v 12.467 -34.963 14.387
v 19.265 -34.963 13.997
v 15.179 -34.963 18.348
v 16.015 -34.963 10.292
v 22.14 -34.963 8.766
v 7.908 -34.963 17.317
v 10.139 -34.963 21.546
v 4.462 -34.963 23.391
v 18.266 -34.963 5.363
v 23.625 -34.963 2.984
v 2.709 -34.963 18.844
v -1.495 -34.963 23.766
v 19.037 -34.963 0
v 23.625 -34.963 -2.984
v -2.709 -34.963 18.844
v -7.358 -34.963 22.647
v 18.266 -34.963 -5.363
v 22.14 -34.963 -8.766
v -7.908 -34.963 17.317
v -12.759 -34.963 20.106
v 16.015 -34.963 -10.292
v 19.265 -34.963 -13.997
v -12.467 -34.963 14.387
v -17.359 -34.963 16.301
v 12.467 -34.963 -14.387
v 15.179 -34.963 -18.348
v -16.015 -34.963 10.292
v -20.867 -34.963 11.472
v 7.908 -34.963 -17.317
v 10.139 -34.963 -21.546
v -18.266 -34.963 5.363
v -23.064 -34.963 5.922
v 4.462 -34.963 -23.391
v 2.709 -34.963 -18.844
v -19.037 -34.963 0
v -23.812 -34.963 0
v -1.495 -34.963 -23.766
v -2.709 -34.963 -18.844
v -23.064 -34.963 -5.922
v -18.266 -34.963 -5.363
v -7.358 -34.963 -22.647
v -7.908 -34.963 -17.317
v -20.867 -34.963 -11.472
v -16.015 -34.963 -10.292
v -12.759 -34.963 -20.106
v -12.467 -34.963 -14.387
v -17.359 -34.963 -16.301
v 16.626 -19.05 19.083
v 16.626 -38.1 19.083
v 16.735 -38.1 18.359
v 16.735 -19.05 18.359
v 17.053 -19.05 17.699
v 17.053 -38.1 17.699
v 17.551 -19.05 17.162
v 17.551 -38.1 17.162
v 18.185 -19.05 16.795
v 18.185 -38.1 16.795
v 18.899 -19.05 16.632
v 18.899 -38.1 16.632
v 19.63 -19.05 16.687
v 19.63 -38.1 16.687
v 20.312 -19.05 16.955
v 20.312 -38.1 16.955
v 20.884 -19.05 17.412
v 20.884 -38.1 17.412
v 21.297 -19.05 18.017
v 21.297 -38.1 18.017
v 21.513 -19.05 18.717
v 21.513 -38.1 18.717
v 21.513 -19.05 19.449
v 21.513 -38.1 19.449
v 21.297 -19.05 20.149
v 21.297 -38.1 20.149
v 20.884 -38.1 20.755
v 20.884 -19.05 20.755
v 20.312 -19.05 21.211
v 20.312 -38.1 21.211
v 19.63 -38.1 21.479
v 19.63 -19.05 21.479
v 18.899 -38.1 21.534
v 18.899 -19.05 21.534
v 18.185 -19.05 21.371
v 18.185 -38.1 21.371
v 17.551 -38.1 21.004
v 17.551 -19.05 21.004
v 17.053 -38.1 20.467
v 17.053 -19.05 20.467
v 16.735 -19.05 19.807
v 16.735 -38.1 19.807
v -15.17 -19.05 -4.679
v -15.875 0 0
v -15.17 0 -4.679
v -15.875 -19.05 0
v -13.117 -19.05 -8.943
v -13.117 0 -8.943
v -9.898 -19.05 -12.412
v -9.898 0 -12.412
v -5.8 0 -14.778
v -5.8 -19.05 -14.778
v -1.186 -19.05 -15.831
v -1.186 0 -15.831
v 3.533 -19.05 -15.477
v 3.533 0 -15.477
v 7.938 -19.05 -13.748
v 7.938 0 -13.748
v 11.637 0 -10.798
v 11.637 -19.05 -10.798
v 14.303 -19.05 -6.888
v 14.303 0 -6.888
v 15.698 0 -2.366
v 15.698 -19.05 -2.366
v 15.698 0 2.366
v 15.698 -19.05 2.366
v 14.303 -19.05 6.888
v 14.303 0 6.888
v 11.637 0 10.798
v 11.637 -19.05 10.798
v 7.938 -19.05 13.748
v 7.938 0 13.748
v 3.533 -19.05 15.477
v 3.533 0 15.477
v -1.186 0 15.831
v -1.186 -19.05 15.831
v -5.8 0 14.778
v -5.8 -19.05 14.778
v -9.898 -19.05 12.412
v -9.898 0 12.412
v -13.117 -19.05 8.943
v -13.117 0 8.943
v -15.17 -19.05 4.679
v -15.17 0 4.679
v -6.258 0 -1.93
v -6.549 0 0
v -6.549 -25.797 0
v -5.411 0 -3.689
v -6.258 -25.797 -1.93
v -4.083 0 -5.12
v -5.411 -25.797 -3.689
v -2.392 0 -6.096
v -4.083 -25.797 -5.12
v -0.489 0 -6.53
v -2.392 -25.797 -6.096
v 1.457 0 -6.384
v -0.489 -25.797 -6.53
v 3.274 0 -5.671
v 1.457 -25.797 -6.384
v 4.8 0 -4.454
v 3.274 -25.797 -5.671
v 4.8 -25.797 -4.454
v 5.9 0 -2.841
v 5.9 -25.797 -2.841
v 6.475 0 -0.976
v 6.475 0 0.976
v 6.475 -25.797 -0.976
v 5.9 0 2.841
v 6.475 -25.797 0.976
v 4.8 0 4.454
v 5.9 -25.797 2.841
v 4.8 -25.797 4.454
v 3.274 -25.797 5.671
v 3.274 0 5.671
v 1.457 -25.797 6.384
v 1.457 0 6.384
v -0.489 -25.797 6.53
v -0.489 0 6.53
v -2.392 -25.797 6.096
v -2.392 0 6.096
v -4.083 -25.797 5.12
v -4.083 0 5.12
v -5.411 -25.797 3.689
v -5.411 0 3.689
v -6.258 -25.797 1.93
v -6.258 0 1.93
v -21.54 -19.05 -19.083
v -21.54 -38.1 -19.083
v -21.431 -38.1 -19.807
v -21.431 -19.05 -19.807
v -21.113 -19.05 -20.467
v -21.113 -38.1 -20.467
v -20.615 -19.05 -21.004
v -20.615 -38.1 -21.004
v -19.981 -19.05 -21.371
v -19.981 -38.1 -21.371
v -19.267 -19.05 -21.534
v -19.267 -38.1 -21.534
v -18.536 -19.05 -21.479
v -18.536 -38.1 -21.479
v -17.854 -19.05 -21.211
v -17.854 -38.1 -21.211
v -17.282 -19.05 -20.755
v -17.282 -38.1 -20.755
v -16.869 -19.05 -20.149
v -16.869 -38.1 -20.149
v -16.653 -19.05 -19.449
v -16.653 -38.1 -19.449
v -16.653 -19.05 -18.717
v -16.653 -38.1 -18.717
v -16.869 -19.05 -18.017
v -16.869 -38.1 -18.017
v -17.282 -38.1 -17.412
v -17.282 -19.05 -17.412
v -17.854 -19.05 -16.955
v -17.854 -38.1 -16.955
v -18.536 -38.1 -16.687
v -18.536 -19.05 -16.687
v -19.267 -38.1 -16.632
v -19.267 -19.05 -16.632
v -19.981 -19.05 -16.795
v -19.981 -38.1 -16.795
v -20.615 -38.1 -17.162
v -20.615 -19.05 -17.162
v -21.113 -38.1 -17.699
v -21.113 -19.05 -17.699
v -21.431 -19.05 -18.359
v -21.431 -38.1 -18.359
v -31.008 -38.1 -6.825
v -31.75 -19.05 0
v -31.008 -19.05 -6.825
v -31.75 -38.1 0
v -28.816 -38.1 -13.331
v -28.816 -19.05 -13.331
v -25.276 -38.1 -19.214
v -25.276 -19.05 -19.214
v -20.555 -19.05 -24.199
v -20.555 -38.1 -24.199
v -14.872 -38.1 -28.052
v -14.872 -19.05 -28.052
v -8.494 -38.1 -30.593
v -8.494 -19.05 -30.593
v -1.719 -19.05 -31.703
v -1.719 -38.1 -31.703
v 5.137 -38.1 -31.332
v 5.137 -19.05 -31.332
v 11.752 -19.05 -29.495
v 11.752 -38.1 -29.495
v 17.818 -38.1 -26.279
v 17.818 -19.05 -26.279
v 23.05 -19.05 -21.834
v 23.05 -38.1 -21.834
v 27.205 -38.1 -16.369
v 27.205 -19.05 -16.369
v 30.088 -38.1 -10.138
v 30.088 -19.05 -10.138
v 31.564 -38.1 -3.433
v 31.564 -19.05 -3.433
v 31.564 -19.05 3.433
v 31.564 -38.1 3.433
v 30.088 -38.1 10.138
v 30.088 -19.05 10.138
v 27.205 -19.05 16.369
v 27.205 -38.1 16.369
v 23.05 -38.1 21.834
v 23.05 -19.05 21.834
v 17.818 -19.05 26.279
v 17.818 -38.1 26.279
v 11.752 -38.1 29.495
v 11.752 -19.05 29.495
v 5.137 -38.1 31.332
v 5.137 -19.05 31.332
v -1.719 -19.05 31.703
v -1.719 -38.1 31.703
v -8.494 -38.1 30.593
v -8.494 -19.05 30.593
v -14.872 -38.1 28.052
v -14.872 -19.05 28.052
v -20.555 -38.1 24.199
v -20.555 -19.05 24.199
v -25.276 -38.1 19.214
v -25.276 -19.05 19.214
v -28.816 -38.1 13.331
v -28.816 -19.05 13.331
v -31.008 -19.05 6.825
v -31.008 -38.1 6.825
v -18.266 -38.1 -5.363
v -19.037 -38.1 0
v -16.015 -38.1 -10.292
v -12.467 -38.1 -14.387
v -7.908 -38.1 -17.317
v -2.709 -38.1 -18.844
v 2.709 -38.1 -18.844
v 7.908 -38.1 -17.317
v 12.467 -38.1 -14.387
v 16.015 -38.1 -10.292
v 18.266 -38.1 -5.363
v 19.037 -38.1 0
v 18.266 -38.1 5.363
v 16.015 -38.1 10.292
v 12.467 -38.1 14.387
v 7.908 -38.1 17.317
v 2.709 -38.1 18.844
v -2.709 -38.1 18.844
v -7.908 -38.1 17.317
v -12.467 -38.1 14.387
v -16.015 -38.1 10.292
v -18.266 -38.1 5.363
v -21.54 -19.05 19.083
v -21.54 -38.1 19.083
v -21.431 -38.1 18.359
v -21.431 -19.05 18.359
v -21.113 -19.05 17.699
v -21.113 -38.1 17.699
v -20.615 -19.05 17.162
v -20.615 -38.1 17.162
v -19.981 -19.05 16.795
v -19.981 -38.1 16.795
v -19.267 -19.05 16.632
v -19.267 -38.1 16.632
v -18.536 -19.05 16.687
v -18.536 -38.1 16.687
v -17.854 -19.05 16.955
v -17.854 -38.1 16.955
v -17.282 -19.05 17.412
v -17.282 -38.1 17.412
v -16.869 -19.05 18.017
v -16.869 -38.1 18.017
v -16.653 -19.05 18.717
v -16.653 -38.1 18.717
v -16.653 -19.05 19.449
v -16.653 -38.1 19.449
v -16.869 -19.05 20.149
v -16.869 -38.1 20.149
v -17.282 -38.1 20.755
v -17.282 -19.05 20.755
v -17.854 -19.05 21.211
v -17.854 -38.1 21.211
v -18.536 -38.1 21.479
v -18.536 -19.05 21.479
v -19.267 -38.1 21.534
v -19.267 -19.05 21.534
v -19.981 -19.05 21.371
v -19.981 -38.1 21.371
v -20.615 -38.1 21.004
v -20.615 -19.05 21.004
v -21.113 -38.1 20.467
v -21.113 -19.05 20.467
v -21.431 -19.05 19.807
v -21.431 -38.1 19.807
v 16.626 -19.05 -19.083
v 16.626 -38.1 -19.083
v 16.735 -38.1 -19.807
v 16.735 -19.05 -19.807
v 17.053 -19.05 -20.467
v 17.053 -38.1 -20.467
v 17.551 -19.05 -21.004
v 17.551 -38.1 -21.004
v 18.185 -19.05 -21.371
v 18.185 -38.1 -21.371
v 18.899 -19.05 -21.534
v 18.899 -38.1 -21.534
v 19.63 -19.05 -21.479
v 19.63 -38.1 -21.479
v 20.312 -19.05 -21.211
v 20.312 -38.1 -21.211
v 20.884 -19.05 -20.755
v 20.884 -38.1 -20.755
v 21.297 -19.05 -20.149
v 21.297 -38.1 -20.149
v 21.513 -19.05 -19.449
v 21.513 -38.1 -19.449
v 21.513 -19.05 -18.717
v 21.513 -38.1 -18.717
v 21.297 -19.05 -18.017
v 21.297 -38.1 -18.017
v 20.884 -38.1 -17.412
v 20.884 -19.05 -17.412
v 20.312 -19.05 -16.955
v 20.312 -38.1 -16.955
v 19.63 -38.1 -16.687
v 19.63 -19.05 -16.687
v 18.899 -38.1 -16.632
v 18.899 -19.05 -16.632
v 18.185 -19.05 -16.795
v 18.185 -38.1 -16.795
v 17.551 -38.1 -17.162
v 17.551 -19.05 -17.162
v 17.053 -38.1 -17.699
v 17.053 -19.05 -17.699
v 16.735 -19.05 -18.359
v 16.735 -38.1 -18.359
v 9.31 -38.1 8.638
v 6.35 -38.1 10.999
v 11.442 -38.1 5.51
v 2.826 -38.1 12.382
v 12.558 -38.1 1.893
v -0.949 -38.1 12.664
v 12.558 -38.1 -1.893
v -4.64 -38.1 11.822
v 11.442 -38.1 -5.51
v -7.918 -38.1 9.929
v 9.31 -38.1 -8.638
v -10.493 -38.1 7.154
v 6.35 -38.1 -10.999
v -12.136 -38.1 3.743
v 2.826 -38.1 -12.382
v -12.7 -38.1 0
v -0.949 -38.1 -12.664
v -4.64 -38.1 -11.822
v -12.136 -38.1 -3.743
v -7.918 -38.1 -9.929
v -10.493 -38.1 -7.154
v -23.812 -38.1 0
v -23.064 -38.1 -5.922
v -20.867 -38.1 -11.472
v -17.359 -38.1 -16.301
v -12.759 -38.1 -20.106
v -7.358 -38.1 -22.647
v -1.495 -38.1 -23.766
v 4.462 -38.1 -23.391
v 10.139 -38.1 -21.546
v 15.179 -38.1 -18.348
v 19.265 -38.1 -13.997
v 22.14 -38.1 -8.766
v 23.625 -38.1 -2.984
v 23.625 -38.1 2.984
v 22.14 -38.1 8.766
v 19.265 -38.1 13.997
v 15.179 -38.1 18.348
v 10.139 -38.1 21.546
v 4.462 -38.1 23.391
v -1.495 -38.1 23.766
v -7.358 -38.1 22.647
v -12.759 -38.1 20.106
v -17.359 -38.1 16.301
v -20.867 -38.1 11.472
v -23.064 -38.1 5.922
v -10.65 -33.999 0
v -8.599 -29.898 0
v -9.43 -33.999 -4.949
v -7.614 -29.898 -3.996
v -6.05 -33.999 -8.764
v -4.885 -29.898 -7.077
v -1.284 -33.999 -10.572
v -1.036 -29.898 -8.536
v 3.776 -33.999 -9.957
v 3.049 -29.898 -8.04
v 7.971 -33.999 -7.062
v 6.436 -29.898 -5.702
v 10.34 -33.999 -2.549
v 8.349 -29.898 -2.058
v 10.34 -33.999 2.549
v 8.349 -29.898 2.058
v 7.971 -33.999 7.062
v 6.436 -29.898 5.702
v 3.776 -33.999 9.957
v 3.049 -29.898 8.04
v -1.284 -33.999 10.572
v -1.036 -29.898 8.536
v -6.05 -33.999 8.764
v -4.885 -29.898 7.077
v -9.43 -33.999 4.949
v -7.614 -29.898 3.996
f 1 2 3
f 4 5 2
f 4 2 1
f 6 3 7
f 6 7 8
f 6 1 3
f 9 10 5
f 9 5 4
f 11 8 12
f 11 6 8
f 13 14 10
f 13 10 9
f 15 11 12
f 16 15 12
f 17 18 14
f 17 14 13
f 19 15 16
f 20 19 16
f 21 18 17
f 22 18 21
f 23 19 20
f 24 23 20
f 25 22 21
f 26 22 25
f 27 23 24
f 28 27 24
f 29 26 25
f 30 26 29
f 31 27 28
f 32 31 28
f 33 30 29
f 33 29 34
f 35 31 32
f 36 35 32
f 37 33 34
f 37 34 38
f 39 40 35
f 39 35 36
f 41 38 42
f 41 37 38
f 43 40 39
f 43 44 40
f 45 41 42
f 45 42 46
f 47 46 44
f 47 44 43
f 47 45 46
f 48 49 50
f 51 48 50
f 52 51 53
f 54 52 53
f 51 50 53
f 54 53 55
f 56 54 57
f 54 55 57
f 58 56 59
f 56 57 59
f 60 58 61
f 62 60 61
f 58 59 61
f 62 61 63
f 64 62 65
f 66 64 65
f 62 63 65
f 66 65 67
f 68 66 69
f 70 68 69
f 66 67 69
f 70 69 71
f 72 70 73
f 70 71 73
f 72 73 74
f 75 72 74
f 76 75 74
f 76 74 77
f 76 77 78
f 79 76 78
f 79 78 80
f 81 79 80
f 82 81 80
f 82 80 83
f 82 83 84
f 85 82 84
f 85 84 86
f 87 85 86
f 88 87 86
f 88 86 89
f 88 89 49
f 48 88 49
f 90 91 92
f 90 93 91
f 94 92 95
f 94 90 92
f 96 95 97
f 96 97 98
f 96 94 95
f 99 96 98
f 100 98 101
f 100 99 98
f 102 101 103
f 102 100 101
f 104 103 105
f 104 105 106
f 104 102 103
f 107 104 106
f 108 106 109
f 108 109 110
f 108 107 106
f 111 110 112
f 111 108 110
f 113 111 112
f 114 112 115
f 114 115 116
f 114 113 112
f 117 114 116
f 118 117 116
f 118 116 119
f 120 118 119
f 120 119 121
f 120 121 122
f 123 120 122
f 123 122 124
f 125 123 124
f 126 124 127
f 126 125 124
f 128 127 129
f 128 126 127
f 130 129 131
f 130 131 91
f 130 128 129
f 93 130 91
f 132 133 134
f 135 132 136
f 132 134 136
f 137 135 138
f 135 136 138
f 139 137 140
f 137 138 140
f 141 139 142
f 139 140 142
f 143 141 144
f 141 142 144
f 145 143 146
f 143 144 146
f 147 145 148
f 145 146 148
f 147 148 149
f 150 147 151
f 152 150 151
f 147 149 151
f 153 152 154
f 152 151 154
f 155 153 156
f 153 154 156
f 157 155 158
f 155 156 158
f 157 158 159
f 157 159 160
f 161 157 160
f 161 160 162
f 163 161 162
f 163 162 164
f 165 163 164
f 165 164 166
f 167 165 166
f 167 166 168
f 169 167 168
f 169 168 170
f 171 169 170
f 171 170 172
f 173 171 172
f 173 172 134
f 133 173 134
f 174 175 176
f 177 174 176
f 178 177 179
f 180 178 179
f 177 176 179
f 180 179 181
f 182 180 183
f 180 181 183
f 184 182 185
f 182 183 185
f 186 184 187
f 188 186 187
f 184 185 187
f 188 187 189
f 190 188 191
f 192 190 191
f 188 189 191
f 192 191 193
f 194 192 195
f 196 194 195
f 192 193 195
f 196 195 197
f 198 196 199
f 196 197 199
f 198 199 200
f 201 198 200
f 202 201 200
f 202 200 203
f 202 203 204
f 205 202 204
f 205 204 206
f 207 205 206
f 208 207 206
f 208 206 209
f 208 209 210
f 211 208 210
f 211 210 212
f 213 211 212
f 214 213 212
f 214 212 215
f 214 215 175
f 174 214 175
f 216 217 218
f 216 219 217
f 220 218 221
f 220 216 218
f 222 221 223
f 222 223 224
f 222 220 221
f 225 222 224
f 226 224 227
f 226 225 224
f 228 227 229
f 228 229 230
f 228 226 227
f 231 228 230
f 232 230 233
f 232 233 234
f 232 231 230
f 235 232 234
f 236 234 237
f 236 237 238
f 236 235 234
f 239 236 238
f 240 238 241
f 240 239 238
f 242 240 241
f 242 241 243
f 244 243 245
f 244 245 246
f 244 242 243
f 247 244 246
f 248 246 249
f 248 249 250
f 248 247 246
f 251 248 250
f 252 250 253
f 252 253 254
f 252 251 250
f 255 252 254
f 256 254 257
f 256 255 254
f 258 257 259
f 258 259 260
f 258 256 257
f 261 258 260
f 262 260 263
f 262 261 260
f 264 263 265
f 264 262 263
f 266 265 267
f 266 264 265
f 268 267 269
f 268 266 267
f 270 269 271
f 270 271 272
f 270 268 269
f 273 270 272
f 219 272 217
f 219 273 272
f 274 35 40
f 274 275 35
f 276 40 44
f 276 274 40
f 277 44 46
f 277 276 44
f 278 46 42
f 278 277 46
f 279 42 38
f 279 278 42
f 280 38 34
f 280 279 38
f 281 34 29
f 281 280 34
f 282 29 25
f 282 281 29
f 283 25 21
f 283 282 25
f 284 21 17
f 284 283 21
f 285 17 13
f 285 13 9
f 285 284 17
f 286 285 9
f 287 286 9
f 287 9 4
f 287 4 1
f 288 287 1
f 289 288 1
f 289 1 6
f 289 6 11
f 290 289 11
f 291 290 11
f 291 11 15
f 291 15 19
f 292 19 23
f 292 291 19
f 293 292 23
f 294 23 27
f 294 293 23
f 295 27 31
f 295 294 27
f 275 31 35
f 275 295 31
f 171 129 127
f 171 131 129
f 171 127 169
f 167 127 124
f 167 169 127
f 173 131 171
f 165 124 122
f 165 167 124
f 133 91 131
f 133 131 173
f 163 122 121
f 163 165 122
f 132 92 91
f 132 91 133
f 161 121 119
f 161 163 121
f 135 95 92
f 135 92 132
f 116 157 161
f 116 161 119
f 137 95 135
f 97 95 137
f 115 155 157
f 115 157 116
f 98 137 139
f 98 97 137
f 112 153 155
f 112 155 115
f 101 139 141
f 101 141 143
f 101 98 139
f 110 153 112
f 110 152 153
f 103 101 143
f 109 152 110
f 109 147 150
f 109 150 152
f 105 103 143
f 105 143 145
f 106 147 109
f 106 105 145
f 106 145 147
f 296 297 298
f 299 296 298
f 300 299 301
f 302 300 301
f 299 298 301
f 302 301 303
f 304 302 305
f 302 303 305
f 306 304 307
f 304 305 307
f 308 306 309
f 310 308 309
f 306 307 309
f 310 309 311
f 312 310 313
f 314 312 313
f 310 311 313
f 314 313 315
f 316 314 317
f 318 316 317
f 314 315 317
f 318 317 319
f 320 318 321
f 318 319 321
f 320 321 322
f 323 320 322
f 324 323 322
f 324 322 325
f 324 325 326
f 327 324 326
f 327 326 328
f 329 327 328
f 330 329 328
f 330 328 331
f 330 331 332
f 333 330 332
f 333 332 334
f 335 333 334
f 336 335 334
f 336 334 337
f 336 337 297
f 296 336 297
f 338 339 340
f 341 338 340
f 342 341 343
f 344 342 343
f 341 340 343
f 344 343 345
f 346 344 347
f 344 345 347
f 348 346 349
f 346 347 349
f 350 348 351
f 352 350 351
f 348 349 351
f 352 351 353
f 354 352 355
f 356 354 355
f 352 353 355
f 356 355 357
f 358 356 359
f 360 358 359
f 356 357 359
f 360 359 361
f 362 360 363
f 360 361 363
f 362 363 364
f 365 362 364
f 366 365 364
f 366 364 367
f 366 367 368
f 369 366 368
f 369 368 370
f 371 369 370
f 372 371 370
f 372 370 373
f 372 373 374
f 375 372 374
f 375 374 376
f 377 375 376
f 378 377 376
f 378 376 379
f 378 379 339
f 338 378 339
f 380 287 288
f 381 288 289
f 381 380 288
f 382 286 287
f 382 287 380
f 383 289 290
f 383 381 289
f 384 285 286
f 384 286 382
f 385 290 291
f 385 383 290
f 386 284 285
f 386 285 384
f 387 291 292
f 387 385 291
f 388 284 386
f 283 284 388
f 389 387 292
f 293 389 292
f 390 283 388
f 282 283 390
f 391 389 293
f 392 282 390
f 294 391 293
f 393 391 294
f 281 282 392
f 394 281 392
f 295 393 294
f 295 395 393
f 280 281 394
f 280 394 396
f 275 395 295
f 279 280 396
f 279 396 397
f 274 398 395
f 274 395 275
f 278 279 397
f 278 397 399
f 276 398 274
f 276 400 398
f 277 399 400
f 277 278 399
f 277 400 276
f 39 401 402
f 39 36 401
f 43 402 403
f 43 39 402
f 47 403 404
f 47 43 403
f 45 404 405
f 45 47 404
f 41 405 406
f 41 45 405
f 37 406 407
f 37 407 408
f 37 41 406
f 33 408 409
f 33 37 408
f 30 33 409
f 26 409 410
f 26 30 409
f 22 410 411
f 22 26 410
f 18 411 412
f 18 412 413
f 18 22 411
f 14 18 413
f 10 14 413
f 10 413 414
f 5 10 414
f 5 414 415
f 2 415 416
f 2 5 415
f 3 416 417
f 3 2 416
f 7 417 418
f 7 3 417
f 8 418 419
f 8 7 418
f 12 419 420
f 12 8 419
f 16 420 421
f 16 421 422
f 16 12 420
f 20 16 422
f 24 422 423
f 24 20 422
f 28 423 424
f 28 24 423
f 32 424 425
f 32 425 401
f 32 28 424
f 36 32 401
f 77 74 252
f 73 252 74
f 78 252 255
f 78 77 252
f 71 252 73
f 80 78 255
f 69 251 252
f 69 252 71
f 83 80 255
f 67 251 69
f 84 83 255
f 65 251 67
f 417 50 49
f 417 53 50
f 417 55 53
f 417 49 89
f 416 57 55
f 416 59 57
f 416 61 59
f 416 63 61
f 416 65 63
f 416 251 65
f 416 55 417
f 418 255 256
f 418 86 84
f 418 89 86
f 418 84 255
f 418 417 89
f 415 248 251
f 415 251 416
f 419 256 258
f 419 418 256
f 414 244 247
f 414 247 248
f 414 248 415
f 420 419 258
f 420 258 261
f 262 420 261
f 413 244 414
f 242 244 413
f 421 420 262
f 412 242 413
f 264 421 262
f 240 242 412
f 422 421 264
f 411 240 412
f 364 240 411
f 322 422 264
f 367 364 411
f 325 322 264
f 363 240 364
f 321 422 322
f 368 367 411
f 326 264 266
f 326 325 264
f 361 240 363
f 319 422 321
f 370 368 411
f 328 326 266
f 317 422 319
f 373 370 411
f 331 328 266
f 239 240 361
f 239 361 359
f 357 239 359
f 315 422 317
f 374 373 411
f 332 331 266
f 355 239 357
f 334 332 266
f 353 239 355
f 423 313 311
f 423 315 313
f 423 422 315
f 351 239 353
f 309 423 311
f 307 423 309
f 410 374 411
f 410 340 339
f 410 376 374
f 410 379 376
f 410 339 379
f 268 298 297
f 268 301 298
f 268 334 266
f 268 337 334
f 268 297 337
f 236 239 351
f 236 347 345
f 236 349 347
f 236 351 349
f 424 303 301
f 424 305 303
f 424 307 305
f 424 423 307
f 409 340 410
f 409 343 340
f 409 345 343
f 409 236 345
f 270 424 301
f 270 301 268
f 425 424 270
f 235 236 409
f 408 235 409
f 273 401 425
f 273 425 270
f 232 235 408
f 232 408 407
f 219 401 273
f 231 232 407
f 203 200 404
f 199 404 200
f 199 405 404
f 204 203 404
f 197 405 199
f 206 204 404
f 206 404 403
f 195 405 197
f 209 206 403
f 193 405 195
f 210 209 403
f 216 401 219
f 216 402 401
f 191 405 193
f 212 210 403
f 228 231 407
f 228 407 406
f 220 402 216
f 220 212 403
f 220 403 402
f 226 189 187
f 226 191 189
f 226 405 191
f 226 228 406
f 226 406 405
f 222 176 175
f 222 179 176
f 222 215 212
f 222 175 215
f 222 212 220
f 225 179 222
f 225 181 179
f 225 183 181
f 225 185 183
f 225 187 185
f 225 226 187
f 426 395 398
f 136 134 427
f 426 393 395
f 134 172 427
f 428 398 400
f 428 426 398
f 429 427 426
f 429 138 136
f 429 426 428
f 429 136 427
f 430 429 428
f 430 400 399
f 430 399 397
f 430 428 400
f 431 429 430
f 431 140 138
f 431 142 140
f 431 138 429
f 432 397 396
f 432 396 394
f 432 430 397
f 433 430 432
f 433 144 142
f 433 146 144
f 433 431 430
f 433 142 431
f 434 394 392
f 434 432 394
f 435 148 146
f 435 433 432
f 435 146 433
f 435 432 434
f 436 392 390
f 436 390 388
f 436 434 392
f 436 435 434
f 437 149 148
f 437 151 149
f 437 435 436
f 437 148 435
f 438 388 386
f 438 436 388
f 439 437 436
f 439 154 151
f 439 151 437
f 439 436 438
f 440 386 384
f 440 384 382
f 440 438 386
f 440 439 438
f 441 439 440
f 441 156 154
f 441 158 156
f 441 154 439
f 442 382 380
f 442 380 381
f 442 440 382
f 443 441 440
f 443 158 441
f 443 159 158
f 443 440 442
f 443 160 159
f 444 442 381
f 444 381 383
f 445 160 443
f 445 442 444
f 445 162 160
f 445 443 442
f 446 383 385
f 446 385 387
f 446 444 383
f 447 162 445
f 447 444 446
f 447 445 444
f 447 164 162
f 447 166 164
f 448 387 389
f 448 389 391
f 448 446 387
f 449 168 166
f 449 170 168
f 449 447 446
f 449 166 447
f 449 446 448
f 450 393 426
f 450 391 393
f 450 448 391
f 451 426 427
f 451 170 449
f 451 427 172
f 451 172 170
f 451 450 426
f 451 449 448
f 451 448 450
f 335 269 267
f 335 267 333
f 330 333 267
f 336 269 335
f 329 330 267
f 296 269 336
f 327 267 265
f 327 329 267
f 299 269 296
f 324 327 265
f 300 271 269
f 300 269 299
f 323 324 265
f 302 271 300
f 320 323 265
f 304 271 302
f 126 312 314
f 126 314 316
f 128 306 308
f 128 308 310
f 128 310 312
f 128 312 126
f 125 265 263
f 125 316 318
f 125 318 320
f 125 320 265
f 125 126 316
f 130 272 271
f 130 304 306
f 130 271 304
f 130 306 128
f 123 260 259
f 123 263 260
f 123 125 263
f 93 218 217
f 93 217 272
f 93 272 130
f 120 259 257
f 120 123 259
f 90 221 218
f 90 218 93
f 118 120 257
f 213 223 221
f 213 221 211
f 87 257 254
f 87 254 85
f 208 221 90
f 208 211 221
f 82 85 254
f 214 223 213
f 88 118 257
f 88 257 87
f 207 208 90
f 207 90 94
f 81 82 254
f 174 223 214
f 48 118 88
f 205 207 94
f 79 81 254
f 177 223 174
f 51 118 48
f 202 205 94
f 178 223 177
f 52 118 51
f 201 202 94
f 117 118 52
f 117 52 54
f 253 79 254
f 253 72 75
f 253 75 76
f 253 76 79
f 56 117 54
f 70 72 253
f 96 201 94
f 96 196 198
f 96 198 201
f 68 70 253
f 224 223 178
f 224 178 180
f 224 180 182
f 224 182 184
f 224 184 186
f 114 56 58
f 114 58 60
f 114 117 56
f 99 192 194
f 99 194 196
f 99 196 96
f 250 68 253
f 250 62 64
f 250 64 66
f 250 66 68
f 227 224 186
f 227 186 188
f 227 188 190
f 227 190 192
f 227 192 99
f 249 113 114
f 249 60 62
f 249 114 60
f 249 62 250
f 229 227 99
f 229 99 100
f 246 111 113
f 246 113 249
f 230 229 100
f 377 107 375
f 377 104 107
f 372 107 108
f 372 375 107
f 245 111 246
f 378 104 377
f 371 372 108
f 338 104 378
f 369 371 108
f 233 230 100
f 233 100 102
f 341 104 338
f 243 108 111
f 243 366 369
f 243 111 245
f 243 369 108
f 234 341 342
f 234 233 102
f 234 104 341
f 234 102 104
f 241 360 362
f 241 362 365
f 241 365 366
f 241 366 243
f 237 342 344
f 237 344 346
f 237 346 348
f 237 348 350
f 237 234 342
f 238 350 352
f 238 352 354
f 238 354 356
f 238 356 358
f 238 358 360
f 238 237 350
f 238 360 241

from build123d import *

# Parameters (mm, degrees)
F_10_0_1935_DIAMETER_HOLE1_D     = 4.9149
F_33_64_0_51563_DIAMETER_HOLE1_D = 13.097002


with BuildPart() as part:
    # Sketch1 → Revolve1 (revolve)
    with BuildSketch(Plane.XY):
        Polygon((-3.175, -19.05), (-12.7, -19.05), (-12.7, -38.1), align=None)
        Polygon((-12.7, -38.1), (-12.7, -19.05), (-3.175, -19.05), (-3.175, 0), (-15.875, 0), (-15.875, -19.05), (-31.75, -19.05), (-31.75, -38.1), (-23.8125, -38.1), (-23.8125, -34.9631), (-19.0373, -34.9631), (-19.0373, -38.1), align=None)
    revolve(axis=Axis((0, 0, 0), (0, -1, 0)))

    # #10 (0.1935) Diameter Hole1 (through all)
    with Locations(Plane(origin=(0, 0, 0), x_dir=(1, 0, 0), z_dir=(0, 1, 0))):
        with Locations((19.083044257, 19.083044257), (-19.083044257, 19.083044257), (-19.083044257, -19.083044257), (19.083044257, -19.083044257)):
            Hole(F_10_0_1935_DIAMETER_HOLE1_D / 2)

    # 33/64 (0.51563) Diameter Hole1 (through all)
    with Locations(Plane(origin=(0, 0, 0), x_dir=(1, 0, 0), z_dir=(0, 1, 0))):
        with Locations((0, 0)):
            Hole(F_33_64_0_51563_DIAMETER_HOLE1_D / 2)


solid = part.part
